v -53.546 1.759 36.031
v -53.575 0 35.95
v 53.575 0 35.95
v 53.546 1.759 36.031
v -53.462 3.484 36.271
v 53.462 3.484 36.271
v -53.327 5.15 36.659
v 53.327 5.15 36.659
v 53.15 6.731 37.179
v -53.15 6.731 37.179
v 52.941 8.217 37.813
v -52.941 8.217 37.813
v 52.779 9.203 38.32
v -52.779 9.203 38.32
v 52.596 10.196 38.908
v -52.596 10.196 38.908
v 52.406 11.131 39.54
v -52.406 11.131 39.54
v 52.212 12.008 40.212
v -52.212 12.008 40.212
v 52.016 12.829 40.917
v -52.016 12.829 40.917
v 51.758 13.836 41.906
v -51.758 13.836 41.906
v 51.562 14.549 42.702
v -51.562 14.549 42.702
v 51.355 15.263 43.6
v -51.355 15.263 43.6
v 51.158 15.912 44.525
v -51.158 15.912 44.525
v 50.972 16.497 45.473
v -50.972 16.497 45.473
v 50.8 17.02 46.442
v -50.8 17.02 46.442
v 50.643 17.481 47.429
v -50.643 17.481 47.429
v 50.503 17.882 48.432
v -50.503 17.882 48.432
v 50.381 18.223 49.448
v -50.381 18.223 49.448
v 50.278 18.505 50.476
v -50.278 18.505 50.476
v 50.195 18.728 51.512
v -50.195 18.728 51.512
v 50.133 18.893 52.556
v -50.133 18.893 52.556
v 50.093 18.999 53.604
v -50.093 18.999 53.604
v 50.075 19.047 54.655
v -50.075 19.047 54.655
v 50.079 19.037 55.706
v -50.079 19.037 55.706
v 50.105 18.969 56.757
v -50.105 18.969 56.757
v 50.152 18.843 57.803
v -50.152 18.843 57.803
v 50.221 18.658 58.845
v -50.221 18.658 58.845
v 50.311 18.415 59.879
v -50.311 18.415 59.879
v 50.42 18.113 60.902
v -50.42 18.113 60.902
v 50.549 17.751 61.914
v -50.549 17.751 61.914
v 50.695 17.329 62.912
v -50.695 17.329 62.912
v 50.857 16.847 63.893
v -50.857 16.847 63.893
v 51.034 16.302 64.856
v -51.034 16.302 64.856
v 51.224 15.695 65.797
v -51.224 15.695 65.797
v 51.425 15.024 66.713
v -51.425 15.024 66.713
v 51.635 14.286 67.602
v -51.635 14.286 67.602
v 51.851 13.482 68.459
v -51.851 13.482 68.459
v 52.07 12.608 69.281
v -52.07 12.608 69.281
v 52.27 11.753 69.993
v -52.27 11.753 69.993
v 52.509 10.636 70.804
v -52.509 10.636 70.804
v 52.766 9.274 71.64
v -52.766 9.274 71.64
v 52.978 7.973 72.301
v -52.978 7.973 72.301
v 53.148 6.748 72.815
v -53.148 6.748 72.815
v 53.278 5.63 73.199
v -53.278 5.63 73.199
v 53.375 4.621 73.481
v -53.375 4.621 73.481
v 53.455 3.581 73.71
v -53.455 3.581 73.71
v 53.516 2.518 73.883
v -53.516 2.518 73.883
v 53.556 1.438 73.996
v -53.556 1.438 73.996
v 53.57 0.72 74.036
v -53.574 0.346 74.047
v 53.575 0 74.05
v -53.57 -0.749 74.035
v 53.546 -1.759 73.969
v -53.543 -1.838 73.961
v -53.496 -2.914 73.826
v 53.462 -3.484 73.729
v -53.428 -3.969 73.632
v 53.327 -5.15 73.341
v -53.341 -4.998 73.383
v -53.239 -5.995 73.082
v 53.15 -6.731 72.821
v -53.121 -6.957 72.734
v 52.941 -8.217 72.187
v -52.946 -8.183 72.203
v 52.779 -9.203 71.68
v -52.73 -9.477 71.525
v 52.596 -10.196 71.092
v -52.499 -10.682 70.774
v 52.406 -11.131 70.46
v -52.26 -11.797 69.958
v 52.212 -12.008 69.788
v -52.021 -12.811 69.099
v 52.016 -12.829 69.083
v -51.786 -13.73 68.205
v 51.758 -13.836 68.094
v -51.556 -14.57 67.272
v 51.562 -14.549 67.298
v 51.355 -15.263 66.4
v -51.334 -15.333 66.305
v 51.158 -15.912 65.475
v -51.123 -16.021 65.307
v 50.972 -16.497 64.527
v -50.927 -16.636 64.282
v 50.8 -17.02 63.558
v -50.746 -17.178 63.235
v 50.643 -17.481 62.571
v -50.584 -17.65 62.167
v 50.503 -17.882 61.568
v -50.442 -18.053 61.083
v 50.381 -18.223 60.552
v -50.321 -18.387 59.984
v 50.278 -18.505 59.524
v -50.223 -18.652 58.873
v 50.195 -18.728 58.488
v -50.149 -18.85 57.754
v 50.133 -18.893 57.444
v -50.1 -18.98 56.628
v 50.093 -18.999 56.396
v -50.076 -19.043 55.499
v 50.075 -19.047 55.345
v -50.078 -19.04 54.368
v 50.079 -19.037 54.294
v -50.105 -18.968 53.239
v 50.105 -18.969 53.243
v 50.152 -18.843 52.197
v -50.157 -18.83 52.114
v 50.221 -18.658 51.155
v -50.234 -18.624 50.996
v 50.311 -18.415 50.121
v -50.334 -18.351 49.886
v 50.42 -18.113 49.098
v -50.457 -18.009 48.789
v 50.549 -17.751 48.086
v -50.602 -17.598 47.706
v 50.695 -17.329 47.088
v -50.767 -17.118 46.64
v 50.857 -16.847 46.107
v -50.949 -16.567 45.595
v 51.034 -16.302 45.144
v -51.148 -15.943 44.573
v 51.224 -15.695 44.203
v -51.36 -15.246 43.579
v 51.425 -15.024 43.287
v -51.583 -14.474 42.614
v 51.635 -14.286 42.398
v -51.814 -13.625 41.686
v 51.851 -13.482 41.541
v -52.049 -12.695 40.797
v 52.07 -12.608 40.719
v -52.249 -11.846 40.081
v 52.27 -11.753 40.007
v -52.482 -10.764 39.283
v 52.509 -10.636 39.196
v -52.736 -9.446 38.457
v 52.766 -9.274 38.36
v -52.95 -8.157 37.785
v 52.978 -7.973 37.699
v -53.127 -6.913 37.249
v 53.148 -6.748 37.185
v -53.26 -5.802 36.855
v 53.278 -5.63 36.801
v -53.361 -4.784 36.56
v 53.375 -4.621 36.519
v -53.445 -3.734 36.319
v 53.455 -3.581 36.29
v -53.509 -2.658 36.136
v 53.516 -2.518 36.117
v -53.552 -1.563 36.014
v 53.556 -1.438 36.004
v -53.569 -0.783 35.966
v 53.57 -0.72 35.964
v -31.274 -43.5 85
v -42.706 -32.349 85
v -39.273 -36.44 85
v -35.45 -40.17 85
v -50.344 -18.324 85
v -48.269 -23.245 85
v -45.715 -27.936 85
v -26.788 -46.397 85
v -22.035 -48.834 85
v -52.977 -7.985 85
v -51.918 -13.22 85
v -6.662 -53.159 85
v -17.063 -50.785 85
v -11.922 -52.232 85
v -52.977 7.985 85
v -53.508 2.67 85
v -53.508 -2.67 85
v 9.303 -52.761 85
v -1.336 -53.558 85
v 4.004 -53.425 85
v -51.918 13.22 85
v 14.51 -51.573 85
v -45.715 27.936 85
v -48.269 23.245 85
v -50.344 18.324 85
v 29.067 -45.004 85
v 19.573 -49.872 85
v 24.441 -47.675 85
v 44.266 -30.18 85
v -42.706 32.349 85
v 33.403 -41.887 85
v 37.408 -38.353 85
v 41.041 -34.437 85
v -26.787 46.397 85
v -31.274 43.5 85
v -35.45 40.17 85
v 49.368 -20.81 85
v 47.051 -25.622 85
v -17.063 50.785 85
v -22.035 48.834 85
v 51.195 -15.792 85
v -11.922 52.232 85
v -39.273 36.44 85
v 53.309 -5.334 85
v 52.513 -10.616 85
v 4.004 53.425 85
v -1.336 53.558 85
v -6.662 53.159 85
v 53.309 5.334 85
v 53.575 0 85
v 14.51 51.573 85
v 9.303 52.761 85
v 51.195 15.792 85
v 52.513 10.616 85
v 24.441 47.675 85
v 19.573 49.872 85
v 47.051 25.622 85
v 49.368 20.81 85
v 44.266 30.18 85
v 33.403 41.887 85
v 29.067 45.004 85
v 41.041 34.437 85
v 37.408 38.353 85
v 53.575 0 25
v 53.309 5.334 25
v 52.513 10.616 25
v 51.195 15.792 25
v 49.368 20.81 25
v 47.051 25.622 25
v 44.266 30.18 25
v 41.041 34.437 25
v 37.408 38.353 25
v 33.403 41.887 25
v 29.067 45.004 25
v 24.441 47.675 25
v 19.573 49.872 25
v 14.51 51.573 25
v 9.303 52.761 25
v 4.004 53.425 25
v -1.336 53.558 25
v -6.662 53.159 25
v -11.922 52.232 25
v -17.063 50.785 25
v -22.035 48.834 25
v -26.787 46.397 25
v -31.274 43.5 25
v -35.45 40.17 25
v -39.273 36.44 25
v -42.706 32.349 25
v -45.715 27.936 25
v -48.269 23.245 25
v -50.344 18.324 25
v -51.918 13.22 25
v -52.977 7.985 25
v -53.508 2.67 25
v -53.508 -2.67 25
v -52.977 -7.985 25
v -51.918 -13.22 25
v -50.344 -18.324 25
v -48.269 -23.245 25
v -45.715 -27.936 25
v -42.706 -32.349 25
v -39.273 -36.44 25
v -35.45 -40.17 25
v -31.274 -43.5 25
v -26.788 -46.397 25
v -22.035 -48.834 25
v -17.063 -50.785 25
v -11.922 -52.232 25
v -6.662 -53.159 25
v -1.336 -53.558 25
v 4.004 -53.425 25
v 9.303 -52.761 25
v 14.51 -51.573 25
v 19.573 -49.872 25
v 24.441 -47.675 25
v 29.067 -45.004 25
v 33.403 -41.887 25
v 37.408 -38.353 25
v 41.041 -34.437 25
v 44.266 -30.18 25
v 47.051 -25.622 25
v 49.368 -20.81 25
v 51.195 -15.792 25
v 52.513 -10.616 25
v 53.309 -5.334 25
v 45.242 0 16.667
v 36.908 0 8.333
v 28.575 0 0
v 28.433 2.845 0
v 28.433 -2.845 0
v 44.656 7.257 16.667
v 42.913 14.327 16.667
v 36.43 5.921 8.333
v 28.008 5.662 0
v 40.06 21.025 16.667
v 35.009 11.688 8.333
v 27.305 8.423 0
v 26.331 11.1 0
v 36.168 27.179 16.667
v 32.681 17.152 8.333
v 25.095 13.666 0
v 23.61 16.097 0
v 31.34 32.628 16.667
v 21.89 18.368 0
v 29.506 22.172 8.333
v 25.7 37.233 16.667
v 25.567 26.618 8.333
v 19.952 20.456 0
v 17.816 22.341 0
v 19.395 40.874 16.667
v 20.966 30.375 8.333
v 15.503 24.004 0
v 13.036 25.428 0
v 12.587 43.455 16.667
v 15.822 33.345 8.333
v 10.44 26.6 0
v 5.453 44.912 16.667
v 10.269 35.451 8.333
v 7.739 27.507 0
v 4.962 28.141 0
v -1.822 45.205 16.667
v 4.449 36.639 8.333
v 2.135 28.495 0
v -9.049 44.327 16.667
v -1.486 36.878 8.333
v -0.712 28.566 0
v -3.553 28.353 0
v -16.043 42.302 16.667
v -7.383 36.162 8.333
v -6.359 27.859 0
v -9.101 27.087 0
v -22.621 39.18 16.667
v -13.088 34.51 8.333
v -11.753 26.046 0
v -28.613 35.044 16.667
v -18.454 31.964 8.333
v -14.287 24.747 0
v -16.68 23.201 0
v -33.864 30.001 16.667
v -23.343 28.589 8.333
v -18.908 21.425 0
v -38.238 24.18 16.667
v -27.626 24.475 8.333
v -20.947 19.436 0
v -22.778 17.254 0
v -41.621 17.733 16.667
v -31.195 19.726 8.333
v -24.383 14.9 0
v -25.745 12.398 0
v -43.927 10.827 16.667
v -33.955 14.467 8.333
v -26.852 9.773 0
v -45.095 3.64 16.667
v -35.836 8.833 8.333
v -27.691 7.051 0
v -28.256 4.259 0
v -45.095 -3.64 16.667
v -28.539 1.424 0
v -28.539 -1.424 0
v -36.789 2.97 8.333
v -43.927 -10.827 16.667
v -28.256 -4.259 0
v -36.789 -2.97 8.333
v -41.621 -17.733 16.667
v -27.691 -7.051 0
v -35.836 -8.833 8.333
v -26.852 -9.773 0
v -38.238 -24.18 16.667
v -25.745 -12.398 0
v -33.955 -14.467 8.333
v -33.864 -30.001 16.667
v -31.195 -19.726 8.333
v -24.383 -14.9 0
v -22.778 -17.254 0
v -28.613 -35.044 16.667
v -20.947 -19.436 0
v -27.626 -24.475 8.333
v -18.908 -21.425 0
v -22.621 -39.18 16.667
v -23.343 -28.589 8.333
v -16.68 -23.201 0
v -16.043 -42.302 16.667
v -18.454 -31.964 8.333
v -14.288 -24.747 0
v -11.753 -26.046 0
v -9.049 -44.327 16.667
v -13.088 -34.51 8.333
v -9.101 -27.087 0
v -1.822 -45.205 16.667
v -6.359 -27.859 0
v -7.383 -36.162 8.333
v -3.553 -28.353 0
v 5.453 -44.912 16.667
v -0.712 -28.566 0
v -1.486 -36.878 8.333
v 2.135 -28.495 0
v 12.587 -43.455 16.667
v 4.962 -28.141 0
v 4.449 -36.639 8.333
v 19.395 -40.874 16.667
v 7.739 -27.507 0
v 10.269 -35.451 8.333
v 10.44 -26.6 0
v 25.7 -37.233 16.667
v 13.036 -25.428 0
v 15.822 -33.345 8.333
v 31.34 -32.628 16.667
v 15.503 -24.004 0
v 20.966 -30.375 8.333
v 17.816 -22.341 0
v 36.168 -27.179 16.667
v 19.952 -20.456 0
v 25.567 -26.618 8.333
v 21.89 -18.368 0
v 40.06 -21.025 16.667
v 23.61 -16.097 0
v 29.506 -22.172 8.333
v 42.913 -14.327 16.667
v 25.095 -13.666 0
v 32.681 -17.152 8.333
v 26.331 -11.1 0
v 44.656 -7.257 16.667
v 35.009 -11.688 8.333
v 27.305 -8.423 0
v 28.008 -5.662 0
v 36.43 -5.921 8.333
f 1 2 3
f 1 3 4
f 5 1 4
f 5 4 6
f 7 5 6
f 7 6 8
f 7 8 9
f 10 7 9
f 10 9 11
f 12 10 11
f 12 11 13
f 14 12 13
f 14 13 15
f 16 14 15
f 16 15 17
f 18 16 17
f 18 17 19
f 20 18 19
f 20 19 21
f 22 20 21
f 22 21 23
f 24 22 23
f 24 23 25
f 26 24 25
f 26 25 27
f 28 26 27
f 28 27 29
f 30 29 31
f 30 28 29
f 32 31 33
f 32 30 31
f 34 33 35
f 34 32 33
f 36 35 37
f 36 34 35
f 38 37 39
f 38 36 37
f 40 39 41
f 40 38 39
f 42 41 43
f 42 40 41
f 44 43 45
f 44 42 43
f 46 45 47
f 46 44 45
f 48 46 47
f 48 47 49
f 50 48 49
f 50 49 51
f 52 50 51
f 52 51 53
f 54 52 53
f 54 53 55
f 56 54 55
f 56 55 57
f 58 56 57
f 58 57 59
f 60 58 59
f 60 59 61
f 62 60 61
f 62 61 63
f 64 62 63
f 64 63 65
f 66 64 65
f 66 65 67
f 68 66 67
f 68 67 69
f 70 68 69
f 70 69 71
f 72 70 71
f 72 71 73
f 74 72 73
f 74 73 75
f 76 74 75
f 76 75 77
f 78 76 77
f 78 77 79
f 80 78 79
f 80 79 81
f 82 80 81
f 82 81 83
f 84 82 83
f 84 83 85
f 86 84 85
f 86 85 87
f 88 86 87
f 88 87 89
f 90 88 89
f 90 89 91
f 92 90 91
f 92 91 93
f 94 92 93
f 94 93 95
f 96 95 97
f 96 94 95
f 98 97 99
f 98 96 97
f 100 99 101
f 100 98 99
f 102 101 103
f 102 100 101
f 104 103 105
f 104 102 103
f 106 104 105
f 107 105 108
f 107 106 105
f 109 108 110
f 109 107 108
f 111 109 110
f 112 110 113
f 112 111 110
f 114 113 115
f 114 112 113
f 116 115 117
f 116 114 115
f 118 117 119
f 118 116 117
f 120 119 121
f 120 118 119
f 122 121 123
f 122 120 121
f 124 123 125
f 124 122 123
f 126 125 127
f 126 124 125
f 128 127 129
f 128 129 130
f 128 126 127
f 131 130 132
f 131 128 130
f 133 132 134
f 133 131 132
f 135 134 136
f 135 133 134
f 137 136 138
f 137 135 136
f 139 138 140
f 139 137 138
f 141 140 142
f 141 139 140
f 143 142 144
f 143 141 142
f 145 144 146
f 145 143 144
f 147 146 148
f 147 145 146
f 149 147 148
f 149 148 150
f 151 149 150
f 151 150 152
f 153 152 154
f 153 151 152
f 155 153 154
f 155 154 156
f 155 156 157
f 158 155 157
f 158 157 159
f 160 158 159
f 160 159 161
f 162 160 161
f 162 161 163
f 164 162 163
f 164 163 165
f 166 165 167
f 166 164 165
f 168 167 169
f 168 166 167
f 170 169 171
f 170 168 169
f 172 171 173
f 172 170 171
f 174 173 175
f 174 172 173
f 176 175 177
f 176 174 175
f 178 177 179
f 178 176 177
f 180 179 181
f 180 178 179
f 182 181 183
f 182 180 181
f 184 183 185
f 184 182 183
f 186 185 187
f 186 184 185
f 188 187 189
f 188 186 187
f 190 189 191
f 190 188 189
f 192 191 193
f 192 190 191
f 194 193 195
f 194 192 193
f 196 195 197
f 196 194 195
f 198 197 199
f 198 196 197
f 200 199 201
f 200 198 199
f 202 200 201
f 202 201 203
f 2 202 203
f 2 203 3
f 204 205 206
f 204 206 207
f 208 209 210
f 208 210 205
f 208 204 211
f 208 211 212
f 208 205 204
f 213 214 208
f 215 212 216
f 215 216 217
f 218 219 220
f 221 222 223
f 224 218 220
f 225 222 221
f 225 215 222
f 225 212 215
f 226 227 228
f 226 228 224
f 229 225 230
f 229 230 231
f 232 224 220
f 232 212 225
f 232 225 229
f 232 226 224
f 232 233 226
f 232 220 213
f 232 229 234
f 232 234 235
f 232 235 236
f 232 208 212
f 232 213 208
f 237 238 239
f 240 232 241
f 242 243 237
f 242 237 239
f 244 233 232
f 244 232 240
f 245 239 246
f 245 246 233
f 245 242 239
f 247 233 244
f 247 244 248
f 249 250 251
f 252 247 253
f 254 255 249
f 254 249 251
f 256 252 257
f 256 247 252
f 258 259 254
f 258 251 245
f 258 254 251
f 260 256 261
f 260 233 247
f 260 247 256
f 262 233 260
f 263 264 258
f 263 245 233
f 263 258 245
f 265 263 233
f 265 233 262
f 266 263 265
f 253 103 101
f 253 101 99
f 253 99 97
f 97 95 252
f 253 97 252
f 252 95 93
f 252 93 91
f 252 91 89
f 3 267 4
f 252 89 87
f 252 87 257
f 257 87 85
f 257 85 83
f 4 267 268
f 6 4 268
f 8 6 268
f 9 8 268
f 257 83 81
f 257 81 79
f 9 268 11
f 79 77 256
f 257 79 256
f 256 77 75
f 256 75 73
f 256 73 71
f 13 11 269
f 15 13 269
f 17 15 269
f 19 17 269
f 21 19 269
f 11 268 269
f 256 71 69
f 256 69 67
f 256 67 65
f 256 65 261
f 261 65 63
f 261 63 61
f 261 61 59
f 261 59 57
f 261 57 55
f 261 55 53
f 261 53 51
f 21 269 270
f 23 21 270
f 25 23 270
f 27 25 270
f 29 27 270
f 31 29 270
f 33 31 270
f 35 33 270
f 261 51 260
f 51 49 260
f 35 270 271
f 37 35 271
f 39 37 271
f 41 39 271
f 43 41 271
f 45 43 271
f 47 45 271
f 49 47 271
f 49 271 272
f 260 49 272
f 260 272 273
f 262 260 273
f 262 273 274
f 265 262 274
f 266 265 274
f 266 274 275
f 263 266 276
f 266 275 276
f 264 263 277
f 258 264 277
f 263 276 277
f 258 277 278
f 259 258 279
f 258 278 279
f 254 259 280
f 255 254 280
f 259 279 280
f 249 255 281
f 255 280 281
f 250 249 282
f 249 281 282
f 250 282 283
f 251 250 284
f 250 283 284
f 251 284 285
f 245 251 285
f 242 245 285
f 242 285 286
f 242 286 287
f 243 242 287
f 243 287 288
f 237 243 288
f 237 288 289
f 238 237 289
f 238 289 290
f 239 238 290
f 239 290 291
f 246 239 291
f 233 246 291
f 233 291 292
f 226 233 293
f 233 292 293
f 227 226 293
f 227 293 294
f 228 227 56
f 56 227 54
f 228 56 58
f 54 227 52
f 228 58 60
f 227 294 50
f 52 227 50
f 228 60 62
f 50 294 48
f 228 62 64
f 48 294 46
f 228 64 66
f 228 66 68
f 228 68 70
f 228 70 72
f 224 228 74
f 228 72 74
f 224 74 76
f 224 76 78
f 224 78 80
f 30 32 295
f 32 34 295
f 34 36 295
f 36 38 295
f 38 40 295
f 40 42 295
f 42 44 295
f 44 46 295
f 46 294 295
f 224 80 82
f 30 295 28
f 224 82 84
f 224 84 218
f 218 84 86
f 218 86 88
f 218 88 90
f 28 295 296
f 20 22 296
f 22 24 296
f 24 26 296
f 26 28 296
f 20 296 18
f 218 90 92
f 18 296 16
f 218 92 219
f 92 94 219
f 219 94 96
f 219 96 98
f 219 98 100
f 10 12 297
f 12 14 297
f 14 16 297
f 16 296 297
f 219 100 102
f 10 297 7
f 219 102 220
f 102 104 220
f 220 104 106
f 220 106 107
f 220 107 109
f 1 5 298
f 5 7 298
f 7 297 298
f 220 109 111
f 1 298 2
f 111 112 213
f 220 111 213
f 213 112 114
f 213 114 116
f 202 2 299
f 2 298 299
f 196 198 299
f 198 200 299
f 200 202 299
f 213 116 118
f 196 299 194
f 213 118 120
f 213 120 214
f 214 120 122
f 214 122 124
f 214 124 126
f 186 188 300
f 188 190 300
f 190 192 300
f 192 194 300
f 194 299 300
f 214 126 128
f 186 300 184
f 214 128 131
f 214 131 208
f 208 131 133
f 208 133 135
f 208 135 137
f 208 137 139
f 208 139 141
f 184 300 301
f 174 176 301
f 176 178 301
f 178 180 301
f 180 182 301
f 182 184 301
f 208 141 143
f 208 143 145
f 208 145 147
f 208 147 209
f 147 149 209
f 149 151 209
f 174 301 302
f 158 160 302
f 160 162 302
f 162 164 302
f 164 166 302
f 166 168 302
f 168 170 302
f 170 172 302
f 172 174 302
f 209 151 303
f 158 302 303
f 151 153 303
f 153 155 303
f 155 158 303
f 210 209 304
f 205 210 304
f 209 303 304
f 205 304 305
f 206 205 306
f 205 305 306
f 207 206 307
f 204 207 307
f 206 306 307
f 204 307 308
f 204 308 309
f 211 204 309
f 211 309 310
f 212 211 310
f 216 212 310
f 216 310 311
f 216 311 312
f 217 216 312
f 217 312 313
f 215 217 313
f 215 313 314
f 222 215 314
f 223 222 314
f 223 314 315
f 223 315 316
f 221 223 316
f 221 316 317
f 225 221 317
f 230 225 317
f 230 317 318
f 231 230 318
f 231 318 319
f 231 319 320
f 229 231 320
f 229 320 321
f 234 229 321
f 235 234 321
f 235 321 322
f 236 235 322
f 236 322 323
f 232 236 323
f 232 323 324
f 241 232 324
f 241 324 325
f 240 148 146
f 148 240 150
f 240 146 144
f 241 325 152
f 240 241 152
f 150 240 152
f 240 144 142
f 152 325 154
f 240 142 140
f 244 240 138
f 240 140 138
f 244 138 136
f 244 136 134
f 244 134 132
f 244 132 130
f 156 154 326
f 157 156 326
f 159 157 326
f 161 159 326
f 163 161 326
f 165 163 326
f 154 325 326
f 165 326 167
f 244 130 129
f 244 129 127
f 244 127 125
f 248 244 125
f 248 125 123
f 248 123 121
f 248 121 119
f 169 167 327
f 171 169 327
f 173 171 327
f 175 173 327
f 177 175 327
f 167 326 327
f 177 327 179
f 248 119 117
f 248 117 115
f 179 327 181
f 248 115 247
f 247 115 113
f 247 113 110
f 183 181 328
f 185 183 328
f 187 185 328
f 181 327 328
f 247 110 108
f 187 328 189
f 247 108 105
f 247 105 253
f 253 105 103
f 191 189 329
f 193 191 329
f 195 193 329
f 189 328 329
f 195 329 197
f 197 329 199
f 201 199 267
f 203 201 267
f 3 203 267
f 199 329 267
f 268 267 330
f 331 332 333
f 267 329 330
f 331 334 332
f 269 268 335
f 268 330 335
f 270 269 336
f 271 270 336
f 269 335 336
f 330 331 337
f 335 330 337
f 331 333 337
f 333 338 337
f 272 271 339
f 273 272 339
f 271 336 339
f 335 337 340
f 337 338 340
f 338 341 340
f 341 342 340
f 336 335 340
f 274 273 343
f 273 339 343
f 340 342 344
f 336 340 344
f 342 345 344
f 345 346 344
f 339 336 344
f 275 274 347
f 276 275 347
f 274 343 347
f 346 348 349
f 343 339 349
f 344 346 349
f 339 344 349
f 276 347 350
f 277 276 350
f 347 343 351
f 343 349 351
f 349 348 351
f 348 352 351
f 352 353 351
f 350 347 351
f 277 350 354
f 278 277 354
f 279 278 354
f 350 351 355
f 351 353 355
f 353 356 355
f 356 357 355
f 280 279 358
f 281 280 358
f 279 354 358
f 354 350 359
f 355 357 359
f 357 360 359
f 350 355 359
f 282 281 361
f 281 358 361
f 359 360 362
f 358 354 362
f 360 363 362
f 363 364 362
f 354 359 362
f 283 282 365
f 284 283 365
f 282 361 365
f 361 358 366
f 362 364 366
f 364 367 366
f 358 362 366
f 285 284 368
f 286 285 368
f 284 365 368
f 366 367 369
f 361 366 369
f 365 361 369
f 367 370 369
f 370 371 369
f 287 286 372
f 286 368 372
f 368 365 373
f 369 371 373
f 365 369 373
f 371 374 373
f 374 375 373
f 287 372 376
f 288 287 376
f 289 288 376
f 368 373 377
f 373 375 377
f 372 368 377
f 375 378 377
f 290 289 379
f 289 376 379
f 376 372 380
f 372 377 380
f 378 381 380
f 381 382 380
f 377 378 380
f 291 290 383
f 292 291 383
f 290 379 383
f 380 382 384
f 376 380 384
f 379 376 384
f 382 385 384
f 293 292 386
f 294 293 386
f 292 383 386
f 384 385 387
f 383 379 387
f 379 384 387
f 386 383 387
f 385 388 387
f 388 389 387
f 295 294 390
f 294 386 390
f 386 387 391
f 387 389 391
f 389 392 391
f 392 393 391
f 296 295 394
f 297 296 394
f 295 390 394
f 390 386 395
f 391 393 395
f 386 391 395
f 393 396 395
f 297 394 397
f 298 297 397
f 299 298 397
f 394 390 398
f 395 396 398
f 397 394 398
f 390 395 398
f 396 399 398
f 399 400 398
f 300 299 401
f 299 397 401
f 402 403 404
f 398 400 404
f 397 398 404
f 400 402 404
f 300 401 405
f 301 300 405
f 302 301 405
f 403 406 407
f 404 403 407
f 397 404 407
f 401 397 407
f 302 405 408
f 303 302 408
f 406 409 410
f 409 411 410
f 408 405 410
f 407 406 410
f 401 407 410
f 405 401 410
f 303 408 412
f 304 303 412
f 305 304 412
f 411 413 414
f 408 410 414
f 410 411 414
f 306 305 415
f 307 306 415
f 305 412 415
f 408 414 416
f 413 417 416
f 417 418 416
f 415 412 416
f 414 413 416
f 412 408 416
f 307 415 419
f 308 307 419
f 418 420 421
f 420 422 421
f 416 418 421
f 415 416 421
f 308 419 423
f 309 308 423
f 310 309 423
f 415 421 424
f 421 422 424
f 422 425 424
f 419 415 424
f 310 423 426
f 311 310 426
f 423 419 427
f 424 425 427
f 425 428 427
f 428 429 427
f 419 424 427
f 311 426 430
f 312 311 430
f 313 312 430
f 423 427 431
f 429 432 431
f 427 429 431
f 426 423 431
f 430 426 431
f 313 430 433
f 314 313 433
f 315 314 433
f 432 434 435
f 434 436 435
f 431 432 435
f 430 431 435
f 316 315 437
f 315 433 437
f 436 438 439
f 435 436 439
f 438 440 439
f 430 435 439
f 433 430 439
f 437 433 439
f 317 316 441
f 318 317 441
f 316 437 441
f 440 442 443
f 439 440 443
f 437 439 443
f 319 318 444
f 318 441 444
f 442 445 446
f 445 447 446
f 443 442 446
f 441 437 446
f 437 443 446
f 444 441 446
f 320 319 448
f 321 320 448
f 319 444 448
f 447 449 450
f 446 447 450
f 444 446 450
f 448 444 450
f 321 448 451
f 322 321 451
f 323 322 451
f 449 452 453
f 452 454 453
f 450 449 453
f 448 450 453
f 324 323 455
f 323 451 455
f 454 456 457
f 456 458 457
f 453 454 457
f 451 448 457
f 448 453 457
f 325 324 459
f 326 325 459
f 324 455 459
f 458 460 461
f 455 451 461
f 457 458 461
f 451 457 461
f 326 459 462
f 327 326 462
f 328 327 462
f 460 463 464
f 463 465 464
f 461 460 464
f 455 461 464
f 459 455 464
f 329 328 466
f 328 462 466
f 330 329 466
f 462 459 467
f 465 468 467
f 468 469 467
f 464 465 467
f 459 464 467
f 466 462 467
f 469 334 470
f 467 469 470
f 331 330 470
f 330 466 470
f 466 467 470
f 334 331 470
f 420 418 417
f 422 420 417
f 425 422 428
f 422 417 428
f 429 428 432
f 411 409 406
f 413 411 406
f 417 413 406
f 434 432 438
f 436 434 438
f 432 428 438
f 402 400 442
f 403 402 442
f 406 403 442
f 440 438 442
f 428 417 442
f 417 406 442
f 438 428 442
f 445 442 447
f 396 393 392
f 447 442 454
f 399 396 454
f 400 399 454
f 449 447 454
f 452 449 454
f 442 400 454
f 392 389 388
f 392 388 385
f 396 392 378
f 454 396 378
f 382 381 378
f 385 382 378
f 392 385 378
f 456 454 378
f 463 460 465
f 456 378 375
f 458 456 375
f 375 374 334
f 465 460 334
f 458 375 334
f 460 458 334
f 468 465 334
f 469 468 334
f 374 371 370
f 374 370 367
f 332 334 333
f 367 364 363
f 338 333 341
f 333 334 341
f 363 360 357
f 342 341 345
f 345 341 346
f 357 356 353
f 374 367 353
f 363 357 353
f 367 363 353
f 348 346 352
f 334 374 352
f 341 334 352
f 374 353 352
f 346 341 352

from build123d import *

# Parameters (mm, degrees)
SKETCH1_R               = 28.575
BOSS_EXTRUDE1_DEPTH     = 25
BOSS_EXTRUDE1_DRAFT     = -45
SKETCH3_R               = 53.575
BOSS_EXTRUDE2_DEPTH     = 60
CUT_EXTRUDE1_DEPTH      = 114.866418447
CUT_EXTRUDE1_DEPTH_BACK = 114.866418447
SKETCH4_R               = 19.05


with BuildPart() as part:
    # Sketch1 → Boss-Extrude1 (with draft: the straight prism first)
    with BuildSketch(Plane.XY):
        Circle(SKETCH1_R)
    extrude(amount=BOSS_EXTRUDE1_DEPTH)
    # Boss-Extrude1: the draft: its side faces are tilted about the plane it starts from
    boss_extrude1_sides = [part.faces().sort_by_distance(p)[0] for p in [
        (-28.575, 0, 12.5),
    ]]
    draft(boss_extrude1_sides, Plane.XY, BOSS_EXTRUDE1_DRAFT)

    # Sketch3 → Boss-Extrude2 (add)
    with BuildSketch(Plane.XY.offset(25)):
        Circle(SKETCH3_R)
    extrude(amount=BOSS_EXTRUDE2_DEPTH)

    # Sketch4 → Cut-Extrude1 (cut, two sides: drawn at the far end of the back side and taken through both)
    with BuildSketch(Plane(origin=(0, 0, 0), x_dir=(0, 0, -1), z_dir=(1, 0, 0)).offset(-CUT_EXTRUDE1_DEPTH_BACK)):
        with Locations((-55, 0)):
            Circle(SKETCH4_R)
    extrude(amount=CUT_EXTRUDE1_DEPTH + CUT_EXTRUDE1_DEPTH_BACK, mode=Mode.SUBTRACT)


solid = part.part
